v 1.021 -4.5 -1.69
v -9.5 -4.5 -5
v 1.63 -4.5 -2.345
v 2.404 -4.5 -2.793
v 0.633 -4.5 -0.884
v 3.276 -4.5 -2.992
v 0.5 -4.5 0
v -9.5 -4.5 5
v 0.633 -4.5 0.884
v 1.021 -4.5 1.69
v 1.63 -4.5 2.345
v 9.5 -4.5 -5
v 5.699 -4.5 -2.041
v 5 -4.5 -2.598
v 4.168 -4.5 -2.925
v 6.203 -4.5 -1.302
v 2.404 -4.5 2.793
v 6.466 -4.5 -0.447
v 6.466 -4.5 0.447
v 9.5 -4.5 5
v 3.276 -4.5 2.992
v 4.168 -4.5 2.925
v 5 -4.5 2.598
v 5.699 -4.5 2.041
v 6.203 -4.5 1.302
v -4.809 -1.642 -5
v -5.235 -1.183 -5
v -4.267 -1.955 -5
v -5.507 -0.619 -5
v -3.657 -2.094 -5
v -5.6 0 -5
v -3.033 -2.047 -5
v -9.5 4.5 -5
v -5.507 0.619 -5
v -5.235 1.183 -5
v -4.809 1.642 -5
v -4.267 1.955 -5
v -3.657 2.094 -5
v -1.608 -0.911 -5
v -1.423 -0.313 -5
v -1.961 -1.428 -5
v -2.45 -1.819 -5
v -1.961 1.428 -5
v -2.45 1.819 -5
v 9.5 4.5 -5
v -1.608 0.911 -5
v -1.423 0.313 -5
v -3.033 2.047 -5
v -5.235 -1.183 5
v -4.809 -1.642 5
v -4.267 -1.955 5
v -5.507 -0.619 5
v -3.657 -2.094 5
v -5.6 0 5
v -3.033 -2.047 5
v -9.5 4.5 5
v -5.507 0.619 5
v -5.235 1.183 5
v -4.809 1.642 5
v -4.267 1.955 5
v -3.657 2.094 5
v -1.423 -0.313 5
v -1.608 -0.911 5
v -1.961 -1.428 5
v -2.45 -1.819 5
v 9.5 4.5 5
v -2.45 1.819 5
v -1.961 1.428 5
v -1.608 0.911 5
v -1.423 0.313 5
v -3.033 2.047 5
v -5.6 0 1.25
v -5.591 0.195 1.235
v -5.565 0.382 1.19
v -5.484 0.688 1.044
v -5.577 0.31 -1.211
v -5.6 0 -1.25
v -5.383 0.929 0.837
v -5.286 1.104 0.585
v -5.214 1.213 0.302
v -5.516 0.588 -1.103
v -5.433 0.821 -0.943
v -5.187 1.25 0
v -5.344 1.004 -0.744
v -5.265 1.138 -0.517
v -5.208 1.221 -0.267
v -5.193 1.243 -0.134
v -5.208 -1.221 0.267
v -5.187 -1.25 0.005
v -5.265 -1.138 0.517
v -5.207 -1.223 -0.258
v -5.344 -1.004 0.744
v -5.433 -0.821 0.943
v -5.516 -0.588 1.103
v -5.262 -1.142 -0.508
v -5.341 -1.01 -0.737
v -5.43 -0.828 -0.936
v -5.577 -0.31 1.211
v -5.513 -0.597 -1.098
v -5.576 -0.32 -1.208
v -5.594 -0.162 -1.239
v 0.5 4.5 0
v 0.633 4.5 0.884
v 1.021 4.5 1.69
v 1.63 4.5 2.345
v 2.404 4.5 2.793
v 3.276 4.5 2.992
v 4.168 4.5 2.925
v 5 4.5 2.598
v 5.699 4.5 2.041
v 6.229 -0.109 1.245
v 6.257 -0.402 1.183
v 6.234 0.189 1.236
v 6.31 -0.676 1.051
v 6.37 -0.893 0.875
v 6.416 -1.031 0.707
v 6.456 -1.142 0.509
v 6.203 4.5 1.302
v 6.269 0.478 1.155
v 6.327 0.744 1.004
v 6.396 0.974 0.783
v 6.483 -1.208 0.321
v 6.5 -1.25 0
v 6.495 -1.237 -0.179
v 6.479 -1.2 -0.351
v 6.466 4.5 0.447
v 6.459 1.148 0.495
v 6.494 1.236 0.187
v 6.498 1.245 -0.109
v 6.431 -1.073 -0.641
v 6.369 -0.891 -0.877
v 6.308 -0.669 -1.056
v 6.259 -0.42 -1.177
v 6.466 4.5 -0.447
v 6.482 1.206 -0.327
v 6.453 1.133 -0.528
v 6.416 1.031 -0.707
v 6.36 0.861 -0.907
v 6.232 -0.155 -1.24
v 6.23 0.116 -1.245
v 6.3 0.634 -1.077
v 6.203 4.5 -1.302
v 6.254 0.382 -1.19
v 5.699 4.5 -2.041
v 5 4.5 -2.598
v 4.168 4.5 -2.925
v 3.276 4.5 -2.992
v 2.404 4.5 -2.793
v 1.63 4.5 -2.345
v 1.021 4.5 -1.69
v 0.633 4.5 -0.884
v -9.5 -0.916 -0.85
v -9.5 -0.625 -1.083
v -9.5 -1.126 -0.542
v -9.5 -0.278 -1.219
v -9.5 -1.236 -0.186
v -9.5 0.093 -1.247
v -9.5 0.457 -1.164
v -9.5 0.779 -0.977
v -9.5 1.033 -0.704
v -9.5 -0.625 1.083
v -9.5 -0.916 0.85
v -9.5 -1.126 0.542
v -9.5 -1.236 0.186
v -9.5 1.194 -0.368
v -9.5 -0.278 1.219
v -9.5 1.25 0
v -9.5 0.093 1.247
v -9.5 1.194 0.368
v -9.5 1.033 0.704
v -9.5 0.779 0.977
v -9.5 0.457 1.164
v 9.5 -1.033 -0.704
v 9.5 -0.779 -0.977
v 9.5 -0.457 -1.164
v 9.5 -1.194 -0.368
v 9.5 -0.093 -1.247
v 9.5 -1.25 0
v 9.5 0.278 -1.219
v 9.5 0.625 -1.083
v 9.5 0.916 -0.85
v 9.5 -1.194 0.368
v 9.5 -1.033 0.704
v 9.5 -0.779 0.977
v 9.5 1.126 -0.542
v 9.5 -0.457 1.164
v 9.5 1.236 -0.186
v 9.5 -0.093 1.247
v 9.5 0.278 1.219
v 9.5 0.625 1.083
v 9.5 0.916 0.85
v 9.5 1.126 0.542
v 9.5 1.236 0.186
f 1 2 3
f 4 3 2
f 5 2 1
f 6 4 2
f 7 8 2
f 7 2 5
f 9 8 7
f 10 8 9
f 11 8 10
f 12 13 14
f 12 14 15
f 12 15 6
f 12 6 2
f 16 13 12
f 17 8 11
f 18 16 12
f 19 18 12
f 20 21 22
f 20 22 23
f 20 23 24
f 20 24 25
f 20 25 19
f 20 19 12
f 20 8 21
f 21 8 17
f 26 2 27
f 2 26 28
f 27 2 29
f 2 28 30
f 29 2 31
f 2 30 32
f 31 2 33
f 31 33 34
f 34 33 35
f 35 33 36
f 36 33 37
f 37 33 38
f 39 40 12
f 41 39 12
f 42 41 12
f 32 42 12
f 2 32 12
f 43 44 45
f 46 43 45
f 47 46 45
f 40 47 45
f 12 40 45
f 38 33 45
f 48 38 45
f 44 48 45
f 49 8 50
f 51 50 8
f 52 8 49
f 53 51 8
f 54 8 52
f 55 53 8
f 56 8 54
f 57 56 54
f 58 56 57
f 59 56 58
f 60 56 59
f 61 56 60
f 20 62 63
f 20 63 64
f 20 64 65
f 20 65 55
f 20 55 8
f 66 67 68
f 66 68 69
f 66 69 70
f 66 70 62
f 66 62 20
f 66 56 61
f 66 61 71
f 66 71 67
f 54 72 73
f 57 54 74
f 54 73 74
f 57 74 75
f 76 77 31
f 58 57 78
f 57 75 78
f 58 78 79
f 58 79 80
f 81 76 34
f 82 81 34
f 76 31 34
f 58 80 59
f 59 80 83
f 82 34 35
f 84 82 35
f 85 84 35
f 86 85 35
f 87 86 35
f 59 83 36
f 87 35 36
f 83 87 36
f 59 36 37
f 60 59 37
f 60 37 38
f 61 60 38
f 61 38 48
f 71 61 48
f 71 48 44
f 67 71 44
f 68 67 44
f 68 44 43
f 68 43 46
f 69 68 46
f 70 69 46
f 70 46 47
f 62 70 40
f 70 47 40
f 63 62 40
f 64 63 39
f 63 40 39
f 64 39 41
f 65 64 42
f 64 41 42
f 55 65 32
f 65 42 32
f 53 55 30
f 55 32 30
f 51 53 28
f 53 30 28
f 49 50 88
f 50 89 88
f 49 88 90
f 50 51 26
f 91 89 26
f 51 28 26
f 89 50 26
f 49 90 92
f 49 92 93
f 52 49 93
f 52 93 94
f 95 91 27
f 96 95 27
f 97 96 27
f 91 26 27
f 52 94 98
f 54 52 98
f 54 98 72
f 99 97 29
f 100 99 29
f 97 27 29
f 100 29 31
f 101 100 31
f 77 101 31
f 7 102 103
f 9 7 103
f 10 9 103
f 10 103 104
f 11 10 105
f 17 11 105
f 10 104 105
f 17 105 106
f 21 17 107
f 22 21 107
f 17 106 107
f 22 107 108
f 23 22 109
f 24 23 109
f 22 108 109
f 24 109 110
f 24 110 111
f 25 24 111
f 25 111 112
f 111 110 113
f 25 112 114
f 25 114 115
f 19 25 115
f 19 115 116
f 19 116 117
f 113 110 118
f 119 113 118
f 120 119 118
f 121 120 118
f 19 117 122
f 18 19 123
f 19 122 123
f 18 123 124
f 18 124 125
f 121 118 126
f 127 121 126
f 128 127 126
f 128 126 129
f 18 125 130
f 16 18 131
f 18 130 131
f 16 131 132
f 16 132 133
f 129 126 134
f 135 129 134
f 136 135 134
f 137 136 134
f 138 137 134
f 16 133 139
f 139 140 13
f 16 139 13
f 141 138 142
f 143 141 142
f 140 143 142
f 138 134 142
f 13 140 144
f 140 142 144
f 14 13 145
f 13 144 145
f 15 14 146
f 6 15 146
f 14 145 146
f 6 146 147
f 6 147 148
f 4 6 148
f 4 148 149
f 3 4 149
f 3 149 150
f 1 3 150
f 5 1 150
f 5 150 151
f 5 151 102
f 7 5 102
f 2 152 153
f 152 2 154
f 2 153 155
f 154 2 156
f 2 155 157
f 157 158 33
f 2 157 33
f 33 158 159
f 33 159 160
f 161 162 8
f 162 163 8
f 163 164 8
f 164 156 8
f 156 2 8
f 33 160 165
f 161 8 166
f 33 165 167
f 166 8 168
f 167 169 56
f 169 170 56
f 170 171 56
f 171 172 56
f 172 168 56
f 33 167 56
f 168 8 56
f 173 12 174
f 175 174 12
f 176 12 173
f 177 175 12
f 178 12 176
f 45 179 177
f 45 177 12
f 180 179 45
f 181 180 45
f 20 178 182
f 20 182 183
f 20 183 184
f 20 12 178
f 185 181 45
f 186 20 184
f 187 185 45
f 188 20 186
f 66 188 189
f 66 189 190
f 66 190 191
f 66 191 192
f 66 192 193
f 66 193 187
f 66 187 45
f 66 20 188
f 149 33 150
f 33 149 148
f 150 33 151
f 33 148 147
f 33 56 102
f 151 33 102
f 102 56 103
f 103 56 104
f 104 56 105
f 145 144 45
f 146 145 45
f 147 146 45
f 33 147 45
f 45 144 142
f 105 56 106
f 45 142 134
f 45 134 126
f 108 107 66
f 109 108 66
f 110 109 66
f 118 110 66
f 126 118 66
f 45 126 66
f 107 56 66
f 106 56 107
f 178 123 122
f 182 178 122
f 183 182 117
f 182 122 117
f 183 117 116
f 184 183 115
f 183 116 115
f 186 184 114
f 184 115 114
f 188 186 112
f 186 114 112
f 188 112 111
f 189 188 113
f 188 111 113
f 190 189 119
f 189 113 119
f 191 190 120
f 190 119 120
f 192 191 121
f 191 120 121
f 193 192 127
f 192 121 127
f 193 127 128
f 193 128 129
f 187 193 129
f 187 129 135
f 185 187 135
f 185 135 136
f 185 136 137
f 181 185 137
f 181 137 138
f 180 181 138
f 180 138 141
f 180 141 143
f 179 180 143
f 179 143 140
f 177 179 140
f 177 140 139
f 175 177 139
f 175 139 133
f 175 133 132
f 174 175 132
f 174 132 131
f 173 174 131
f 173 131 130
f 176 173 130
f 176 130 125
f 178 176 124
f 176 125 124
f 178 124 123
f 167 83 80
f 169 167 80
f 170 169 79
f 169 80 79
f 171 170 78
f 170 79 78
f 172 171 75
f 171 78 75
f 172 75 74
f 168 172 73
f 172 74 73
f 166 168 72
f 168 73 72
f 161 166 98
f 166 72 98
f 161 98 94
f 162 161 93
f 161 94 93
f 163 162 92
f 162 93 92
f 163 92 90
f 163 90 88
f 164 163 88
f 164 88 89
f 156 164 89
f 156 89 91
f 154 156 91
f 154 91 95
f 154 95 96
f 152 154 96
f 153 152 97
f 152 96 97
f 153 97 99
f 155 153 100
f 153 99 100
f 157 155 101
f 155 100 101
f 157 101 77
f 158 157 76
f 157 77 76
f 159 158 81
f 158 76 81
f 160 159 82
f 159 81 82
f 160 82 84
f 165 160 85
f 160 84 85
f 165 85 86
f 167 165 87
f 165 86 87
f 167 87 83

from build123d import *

# Parameters (mm, degrees)
F0_W     = 19
F0_H     = 9
F1_DEPTH = 5
F3_D     = 4.2
F5_D     = 6
F7_D     = 2.5
F7_DEPTH = 5
F7_TIP   = 0.7510757738
F9_D     = 2.5
F9_DEPTH = 6
F9_TIP   = 0.7510757738


with BuildPart() as f1:
    # F0 (on Top) → F1 (new body, symmetric)
    with BuildSketch(Plane.XY):
        Rectangle(F0_W, F0_H)
    extrude(amount=F1_DEPTH, both=True)

    # F3 (through all)
    with Locations(Plane.XY.offset(5)):
        with Locations((-3.5, 0)):
            Hole(F3_D / 2)

    # F5 (through all)
    with Locations(Plane.XZ.offset(4.5)):
        with Locations((3.5, 0)):
            Hole(F5_D / 2)

    # F7
    with Locations(Plane.YZ.offset(9.5)):
        with Locations((0, 0)):
            Hole(F7_D / 2, depth=F7_DEPTH)
            with Locations((0, 0, -(F7_DEPTH + F7_TIP / 2))):  # 118° drill point
                Cone(0, F7_D / 2, F7_TIP, mode=Mode.SUBTRACT)

    # F9
    with Locations(Plane(origin=(-9.5, 0, 0), x_dir=(0, -1, 0), z_dir=(-1, 0, 0))):
        with Locations((0, 0)):
            Hole(F9_D / 2, depth=F9_DEPTH)
            with Locations((0, 0, -(F9_DEPTH + F9_TIP / 2))):  # 118° drill point
                Cone(0, F9_D / 2, F9_TIP, mode=Mode.SUBTRACT)


solid = f1.part
